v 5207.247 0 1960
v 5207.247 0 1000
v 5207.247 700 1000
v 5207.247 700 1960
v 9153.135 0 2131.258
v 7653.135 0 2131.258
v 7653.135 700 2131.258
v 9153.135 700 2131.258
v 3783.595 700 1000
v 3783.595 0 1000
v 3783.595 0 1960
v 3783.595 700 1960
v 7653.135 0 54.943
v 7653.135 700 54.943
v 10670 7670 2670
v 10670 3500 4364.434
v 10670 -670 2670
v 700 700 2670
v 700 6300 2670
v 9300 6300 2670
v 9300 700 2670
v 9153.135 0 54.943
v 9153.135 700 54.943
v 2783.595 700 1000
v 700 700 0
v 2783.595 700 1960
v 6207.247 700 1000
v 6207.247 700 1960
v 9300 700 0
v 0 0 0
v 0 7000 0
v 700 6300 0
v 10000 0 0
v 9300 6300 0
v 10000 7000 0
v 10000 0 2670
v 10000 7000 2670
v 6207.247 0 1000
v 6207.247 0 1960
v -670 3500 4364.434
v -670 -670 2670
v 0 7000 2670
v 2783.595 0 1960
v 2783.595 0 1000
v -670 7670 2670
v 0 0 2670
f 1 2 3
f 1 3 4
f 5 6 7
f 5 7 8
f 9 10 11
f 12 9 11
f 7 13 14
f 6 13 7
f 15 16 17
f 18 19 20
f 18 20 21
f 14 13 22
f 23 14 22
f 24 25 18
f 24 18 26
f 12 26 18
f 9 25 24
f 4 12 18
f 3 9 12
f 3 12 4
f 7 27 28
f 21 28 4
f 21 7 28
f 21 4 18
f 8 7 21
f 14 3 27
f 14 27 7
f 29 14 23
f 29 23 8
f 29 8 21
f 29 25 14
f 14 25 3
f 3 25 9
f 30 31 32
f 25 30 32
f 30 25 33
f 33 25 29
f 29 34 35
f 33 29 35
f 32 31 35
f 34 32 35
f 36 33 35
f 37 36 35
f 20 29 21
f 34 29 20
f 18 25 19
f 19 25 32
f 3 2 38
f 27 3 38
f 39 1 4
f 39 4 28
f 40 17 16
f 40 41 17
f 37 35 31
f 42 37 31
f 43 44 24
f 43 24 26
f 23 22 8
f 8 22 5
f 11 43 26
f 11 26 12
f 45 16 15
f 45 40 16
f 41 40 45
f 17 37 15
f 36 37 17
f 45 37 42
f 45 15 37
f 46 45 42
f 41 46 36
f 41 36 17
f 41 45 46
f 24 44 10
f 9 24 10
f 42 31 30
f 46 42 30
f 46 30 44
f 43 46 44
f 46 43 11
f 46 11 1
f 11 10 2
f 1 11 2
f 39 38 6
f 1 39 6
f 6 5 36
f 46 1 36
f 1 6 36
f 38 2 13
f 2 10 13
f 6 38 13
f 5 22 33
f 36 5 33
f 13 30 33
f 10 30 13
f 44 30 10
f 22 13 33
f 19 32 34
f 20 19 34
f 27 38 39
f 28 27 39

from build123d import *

# Parameters (mm, degrees)
F0_W          = 8600
F0_H          = 5600
F1_DEPTH      = 2670
F2_W          = 1500
F2_H          = 2076.315373
F2_W_2        = 1000
F2_H_2        = 960
F3_DEPTH      = 700
F5_DEPTH      = 670
F5_DEPTH_BACK = 10670


with BuildPart() as f1:
    # F0 (on Top) → F1 (new body)
    with BuildSketch(Plane.XY):
        Polygon((0, 7000), (0, 0), (690.367639, 0), (700, 0), (10000, 0), (10000, 7000), align=None)
        with Locations((5000, 3500)):
            Rectangle(F0_W, F0_H, mode=Mode.SUBTRACT)
    extrude(amount=F1_DEPTH)

    # F2 (on face) → F3 (cut, through all)
    with BuildSketch(Plane.XZ):
        with Locations((8403.1353, 1093.100324)):
            Rectangle(F2_W, F2_H)
        with Locations((5707.247257, 1480)):
            Rectangle(F2_W_2, F2_H_2)
        with Locations((3283.594608, 1480)):
            Rectangle(F2_W_2, F2_H_2)
    extrude(amount=-F3_DEPTH, mode=Mode.SUBTRACT)

    # F4 (on face) → F5 (join, two sides)
    with BuildSketch(Plane(origin=(0, 0, 0), x_dir=(0, -1, 0), z_dir=(-1, 0, 0))) as f5_sk:
        Polygon((-3500, 4364.433988), (-7670, 2670), (-7000, 2670), (0, 2670), (670, 2670), align=None)
    extrude(amount=F5_DEPTH)
    extrude(f5_sk.sketch, amount=-F5_DEPTH_BACK)


solid = f1.part
